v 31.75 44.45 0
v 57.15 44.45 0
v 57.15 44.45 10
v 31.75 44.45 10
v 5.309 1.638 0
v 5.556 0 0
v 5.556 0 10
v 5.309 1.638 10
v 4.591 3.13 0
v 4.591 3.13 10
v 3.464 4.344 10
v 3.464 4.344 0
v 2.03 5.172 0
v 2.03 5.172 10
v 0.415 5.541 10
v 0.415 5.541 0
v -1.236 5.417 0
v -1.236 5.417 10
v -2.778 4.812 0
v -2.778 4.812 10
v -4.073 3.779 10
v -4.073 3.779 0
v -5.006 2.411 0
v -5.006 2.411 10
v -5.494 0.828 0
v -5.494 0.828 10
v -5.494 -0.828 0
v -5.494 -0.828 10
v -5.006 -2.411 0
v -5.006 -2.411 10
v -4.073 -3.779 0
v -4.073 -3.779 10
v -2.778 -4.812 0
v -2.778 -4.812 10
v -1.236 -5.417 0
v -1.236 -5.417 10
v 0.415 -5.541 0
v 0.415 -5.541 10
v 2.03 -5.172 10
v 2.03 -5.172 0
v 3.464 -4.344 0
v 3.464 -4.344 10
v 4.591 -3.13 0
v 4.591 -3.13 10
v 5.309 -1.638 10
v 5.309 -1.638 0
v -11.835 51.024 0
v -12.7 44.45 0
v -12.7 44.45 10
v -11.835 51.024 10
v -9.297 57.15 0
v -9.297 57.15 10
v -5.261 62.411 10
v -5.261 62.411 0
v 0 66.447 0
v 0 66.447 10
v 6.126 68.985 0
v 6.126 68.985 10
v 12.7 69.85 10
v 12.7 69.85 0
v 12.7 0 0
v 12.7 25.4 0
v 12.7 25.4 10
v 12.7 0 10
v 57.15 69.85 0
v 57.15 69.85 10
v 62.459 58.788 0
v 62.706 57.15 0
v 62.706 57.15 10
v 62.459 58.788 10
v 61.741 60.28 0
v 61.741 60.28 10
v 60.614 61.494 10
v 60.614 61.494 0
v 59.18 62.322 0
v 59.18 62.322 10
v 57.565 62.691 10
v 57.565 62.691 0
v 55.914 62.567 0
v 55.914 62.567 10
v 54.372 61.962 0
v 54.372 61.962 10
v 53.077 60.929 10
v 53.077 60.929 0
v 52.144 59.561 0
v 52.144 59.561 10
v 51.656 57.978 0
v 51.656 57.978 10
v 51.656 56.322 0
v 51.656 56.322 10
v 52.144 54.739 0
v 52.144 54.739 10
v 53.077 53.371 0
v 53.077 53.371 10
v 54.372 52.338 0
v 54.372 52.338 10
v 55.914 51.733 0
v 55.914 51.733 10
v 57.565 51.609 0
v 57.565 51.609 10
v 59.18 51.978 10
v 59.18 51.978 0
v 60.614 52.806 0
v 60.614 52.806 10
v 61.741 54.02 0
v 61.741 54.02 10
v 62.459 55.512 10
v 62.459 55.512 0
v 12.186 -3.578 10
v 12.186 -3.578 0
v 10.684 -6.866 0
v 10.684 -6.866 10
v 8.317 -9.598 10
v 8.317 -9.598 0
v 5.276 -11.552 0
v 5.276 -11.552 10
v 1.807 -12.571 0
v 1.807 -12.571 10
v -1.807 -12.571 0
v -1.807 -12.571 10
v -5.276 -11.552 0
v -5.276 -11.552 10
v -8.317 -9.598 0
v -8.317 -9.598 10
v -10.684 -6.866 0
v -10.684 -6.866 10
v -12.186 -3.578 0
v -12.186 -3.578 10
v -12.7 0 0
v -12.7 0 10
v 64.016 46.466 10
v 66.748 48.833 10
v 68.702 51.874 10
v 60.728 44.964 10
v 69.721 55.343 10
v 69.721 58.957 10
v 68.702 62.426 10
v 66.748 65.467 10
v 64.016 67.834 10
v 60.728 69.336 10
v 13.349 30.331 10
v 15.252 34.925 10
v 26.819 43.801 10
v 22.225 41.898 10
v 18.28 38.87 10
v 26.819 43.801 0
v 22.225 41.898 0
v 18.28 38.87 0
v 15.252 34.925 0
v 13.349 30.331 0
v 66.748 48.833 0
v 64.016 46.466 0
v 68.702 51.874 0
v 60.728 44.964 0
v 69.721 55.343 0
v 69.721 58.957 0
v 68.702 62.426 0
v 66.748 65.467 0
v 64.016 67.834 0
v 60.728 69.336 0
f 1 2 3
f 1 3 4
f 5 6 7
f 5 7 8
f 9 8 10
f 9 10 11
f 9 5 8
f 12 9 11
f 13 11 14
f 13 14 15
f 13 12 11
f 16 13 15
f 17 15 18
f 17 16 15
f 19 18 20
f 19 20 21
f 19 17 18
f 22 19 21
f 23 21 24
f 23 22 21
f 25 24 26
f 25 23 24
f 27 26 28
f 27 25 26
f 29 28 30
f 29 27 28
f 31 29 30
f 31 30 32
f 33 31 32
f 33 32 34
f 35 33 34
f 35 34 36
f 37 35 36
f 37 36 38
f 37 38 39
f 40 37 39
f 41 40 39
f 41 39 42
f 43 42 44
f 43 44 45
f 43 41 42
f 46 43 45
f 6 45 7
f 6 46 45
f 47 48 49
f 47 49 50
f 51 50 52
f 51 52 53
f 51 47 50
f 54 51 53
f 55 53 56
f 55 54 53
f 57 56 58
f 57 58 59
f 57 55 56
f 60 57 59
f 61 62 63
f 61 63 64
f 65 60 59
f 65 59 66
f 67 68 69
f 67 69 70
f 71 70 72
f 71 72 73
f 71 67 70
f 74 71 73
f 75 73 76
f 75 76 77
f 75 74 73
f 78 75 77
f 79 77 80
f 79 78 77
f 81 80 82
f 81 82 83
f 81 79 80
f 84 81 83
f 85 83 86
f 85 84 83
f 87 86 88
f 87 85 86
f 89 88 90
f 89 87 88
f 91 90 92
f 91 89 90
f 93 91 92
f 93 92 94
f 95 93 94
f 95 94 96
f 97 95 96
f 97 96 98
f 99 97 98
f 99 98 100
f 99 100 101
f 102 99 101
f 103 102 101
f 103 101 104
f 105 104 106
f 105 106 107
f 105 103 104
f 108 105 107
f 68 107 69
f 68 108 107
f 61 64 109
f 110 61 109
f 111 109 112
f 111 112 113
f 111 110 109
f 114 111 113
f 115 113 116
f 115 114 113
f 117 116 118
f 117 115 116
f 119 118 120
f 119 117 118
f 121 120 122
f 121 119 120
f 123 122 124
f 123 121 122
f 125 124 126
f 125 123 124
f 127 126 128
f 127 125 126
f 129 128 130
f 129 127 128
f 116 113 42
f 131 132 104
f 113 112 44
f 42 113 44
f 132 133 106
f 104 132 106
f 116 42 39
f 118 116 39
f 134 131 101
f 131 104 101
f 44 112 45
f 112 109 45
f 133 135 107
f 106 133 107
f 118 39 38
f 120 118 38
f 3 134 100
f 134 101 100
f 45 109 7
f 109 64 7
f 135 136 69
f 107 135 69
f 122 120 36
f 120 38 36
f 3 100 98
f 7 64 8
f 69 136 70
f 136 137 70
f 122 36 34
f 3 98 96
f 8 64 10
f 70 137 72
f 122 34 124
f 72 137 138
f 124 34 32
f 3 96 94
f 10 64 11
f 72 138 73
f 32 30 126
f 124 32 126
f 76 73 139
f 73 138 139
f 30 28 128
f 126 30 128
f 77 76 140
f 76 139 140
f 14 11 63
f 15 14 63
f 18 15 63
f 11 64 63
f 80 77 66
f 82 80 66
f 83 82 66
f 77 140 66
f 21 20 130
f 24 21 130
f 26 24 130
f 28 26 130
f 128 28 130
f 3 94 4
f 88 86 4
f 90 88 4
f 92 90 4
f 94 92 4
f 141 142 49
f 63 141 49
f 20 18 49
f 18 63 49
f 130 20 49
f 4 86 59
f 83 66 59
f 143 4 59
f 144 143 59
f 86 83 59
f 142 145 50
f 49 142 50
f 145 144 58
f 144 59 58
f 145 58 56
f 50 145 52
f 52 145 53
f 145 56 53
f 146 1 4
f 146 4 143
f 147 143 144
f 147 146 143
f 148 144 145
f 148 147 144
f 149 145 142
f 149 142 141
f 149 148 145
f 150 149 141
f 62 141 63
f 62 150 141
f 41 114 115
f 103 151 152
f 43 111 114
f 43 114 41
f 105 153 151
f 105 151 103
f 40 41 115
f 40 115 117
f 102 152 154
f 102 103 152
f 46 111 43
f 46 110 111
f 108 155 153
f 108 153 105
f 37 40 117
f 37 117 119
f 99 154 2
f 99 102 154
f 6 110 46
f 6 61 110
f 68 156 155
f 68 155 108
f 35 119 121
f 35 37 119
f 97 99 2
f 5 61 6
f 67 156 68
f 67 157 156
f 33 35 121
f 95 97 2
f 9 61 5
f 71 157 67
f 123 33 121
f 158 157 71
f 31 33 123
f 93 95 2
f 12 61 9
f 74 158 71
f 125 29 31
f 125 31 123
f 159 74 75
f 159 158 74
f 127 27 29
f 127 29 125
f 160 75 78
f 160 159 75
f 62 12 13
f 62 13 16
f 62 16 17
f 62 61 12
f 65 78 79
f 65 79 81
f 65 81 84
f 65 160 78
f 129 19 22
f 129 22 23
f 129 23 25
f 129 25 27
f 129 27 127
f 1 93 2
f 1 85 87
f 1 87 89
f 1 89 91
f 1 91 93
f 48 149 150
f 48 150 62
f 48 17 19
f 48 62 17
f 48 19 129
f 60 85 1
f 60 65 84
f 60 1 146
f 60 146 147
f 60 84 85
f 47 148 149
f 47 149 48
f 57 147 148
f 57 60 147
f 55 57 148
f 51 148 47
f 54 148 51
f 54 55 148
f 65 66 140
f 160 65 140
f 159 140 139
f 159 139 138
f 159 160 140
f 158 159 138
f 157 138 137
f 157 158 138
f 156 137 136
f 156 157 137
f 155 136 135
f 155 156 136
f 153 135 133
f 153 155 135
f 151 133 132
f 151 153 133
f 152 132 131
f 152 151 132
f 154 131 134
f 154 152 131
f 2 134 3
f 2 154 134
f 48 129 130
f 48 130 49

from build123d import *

# Parameters (mm, degrees)
SKETCH1_R           = 5.55625
BOSS_EXTRUDE1_DEPTH = 10


with BuildPart() as part:
    # Sketch1 → Boss-Extrude1 (new body)
    with BuildSketch(Plane.XY):
        with BuildLine():
            ThreePointArc((-12.7, 44.45), (-5.260512242, 62.410512242), (12.7, 69.85))
            Line((12.7, 69.85), (57.15, 69.85))
            ThreePointArc((57.15, 69.85), (69.85, 57.15), (57.15, 44.45))
            Line((57.15, 44.45), (31.75, 44.45))
            ThreePointArc((31.75, 44.45), (18.279615818, 38.870384182), (12.7, 25.4))
            Line((12.7, 25.4), (12.7, 0))
            ThreePointArc((12.7, 0), (0, -12.7), (-12.7, 0))
            Line((-12.7, 0), (-12.7, 44.45))
        make_face()
        with Locations((57.15, 57.15)):
            Circle(SKETCH1_R, mode=Mode.SUBTRACT)
        Circle(SKETCH1_R, mode=Mode.SUBTRACT)
    extrude(amount=BOSS_EXTRUDE1_DEPTH)


solid = part.part
